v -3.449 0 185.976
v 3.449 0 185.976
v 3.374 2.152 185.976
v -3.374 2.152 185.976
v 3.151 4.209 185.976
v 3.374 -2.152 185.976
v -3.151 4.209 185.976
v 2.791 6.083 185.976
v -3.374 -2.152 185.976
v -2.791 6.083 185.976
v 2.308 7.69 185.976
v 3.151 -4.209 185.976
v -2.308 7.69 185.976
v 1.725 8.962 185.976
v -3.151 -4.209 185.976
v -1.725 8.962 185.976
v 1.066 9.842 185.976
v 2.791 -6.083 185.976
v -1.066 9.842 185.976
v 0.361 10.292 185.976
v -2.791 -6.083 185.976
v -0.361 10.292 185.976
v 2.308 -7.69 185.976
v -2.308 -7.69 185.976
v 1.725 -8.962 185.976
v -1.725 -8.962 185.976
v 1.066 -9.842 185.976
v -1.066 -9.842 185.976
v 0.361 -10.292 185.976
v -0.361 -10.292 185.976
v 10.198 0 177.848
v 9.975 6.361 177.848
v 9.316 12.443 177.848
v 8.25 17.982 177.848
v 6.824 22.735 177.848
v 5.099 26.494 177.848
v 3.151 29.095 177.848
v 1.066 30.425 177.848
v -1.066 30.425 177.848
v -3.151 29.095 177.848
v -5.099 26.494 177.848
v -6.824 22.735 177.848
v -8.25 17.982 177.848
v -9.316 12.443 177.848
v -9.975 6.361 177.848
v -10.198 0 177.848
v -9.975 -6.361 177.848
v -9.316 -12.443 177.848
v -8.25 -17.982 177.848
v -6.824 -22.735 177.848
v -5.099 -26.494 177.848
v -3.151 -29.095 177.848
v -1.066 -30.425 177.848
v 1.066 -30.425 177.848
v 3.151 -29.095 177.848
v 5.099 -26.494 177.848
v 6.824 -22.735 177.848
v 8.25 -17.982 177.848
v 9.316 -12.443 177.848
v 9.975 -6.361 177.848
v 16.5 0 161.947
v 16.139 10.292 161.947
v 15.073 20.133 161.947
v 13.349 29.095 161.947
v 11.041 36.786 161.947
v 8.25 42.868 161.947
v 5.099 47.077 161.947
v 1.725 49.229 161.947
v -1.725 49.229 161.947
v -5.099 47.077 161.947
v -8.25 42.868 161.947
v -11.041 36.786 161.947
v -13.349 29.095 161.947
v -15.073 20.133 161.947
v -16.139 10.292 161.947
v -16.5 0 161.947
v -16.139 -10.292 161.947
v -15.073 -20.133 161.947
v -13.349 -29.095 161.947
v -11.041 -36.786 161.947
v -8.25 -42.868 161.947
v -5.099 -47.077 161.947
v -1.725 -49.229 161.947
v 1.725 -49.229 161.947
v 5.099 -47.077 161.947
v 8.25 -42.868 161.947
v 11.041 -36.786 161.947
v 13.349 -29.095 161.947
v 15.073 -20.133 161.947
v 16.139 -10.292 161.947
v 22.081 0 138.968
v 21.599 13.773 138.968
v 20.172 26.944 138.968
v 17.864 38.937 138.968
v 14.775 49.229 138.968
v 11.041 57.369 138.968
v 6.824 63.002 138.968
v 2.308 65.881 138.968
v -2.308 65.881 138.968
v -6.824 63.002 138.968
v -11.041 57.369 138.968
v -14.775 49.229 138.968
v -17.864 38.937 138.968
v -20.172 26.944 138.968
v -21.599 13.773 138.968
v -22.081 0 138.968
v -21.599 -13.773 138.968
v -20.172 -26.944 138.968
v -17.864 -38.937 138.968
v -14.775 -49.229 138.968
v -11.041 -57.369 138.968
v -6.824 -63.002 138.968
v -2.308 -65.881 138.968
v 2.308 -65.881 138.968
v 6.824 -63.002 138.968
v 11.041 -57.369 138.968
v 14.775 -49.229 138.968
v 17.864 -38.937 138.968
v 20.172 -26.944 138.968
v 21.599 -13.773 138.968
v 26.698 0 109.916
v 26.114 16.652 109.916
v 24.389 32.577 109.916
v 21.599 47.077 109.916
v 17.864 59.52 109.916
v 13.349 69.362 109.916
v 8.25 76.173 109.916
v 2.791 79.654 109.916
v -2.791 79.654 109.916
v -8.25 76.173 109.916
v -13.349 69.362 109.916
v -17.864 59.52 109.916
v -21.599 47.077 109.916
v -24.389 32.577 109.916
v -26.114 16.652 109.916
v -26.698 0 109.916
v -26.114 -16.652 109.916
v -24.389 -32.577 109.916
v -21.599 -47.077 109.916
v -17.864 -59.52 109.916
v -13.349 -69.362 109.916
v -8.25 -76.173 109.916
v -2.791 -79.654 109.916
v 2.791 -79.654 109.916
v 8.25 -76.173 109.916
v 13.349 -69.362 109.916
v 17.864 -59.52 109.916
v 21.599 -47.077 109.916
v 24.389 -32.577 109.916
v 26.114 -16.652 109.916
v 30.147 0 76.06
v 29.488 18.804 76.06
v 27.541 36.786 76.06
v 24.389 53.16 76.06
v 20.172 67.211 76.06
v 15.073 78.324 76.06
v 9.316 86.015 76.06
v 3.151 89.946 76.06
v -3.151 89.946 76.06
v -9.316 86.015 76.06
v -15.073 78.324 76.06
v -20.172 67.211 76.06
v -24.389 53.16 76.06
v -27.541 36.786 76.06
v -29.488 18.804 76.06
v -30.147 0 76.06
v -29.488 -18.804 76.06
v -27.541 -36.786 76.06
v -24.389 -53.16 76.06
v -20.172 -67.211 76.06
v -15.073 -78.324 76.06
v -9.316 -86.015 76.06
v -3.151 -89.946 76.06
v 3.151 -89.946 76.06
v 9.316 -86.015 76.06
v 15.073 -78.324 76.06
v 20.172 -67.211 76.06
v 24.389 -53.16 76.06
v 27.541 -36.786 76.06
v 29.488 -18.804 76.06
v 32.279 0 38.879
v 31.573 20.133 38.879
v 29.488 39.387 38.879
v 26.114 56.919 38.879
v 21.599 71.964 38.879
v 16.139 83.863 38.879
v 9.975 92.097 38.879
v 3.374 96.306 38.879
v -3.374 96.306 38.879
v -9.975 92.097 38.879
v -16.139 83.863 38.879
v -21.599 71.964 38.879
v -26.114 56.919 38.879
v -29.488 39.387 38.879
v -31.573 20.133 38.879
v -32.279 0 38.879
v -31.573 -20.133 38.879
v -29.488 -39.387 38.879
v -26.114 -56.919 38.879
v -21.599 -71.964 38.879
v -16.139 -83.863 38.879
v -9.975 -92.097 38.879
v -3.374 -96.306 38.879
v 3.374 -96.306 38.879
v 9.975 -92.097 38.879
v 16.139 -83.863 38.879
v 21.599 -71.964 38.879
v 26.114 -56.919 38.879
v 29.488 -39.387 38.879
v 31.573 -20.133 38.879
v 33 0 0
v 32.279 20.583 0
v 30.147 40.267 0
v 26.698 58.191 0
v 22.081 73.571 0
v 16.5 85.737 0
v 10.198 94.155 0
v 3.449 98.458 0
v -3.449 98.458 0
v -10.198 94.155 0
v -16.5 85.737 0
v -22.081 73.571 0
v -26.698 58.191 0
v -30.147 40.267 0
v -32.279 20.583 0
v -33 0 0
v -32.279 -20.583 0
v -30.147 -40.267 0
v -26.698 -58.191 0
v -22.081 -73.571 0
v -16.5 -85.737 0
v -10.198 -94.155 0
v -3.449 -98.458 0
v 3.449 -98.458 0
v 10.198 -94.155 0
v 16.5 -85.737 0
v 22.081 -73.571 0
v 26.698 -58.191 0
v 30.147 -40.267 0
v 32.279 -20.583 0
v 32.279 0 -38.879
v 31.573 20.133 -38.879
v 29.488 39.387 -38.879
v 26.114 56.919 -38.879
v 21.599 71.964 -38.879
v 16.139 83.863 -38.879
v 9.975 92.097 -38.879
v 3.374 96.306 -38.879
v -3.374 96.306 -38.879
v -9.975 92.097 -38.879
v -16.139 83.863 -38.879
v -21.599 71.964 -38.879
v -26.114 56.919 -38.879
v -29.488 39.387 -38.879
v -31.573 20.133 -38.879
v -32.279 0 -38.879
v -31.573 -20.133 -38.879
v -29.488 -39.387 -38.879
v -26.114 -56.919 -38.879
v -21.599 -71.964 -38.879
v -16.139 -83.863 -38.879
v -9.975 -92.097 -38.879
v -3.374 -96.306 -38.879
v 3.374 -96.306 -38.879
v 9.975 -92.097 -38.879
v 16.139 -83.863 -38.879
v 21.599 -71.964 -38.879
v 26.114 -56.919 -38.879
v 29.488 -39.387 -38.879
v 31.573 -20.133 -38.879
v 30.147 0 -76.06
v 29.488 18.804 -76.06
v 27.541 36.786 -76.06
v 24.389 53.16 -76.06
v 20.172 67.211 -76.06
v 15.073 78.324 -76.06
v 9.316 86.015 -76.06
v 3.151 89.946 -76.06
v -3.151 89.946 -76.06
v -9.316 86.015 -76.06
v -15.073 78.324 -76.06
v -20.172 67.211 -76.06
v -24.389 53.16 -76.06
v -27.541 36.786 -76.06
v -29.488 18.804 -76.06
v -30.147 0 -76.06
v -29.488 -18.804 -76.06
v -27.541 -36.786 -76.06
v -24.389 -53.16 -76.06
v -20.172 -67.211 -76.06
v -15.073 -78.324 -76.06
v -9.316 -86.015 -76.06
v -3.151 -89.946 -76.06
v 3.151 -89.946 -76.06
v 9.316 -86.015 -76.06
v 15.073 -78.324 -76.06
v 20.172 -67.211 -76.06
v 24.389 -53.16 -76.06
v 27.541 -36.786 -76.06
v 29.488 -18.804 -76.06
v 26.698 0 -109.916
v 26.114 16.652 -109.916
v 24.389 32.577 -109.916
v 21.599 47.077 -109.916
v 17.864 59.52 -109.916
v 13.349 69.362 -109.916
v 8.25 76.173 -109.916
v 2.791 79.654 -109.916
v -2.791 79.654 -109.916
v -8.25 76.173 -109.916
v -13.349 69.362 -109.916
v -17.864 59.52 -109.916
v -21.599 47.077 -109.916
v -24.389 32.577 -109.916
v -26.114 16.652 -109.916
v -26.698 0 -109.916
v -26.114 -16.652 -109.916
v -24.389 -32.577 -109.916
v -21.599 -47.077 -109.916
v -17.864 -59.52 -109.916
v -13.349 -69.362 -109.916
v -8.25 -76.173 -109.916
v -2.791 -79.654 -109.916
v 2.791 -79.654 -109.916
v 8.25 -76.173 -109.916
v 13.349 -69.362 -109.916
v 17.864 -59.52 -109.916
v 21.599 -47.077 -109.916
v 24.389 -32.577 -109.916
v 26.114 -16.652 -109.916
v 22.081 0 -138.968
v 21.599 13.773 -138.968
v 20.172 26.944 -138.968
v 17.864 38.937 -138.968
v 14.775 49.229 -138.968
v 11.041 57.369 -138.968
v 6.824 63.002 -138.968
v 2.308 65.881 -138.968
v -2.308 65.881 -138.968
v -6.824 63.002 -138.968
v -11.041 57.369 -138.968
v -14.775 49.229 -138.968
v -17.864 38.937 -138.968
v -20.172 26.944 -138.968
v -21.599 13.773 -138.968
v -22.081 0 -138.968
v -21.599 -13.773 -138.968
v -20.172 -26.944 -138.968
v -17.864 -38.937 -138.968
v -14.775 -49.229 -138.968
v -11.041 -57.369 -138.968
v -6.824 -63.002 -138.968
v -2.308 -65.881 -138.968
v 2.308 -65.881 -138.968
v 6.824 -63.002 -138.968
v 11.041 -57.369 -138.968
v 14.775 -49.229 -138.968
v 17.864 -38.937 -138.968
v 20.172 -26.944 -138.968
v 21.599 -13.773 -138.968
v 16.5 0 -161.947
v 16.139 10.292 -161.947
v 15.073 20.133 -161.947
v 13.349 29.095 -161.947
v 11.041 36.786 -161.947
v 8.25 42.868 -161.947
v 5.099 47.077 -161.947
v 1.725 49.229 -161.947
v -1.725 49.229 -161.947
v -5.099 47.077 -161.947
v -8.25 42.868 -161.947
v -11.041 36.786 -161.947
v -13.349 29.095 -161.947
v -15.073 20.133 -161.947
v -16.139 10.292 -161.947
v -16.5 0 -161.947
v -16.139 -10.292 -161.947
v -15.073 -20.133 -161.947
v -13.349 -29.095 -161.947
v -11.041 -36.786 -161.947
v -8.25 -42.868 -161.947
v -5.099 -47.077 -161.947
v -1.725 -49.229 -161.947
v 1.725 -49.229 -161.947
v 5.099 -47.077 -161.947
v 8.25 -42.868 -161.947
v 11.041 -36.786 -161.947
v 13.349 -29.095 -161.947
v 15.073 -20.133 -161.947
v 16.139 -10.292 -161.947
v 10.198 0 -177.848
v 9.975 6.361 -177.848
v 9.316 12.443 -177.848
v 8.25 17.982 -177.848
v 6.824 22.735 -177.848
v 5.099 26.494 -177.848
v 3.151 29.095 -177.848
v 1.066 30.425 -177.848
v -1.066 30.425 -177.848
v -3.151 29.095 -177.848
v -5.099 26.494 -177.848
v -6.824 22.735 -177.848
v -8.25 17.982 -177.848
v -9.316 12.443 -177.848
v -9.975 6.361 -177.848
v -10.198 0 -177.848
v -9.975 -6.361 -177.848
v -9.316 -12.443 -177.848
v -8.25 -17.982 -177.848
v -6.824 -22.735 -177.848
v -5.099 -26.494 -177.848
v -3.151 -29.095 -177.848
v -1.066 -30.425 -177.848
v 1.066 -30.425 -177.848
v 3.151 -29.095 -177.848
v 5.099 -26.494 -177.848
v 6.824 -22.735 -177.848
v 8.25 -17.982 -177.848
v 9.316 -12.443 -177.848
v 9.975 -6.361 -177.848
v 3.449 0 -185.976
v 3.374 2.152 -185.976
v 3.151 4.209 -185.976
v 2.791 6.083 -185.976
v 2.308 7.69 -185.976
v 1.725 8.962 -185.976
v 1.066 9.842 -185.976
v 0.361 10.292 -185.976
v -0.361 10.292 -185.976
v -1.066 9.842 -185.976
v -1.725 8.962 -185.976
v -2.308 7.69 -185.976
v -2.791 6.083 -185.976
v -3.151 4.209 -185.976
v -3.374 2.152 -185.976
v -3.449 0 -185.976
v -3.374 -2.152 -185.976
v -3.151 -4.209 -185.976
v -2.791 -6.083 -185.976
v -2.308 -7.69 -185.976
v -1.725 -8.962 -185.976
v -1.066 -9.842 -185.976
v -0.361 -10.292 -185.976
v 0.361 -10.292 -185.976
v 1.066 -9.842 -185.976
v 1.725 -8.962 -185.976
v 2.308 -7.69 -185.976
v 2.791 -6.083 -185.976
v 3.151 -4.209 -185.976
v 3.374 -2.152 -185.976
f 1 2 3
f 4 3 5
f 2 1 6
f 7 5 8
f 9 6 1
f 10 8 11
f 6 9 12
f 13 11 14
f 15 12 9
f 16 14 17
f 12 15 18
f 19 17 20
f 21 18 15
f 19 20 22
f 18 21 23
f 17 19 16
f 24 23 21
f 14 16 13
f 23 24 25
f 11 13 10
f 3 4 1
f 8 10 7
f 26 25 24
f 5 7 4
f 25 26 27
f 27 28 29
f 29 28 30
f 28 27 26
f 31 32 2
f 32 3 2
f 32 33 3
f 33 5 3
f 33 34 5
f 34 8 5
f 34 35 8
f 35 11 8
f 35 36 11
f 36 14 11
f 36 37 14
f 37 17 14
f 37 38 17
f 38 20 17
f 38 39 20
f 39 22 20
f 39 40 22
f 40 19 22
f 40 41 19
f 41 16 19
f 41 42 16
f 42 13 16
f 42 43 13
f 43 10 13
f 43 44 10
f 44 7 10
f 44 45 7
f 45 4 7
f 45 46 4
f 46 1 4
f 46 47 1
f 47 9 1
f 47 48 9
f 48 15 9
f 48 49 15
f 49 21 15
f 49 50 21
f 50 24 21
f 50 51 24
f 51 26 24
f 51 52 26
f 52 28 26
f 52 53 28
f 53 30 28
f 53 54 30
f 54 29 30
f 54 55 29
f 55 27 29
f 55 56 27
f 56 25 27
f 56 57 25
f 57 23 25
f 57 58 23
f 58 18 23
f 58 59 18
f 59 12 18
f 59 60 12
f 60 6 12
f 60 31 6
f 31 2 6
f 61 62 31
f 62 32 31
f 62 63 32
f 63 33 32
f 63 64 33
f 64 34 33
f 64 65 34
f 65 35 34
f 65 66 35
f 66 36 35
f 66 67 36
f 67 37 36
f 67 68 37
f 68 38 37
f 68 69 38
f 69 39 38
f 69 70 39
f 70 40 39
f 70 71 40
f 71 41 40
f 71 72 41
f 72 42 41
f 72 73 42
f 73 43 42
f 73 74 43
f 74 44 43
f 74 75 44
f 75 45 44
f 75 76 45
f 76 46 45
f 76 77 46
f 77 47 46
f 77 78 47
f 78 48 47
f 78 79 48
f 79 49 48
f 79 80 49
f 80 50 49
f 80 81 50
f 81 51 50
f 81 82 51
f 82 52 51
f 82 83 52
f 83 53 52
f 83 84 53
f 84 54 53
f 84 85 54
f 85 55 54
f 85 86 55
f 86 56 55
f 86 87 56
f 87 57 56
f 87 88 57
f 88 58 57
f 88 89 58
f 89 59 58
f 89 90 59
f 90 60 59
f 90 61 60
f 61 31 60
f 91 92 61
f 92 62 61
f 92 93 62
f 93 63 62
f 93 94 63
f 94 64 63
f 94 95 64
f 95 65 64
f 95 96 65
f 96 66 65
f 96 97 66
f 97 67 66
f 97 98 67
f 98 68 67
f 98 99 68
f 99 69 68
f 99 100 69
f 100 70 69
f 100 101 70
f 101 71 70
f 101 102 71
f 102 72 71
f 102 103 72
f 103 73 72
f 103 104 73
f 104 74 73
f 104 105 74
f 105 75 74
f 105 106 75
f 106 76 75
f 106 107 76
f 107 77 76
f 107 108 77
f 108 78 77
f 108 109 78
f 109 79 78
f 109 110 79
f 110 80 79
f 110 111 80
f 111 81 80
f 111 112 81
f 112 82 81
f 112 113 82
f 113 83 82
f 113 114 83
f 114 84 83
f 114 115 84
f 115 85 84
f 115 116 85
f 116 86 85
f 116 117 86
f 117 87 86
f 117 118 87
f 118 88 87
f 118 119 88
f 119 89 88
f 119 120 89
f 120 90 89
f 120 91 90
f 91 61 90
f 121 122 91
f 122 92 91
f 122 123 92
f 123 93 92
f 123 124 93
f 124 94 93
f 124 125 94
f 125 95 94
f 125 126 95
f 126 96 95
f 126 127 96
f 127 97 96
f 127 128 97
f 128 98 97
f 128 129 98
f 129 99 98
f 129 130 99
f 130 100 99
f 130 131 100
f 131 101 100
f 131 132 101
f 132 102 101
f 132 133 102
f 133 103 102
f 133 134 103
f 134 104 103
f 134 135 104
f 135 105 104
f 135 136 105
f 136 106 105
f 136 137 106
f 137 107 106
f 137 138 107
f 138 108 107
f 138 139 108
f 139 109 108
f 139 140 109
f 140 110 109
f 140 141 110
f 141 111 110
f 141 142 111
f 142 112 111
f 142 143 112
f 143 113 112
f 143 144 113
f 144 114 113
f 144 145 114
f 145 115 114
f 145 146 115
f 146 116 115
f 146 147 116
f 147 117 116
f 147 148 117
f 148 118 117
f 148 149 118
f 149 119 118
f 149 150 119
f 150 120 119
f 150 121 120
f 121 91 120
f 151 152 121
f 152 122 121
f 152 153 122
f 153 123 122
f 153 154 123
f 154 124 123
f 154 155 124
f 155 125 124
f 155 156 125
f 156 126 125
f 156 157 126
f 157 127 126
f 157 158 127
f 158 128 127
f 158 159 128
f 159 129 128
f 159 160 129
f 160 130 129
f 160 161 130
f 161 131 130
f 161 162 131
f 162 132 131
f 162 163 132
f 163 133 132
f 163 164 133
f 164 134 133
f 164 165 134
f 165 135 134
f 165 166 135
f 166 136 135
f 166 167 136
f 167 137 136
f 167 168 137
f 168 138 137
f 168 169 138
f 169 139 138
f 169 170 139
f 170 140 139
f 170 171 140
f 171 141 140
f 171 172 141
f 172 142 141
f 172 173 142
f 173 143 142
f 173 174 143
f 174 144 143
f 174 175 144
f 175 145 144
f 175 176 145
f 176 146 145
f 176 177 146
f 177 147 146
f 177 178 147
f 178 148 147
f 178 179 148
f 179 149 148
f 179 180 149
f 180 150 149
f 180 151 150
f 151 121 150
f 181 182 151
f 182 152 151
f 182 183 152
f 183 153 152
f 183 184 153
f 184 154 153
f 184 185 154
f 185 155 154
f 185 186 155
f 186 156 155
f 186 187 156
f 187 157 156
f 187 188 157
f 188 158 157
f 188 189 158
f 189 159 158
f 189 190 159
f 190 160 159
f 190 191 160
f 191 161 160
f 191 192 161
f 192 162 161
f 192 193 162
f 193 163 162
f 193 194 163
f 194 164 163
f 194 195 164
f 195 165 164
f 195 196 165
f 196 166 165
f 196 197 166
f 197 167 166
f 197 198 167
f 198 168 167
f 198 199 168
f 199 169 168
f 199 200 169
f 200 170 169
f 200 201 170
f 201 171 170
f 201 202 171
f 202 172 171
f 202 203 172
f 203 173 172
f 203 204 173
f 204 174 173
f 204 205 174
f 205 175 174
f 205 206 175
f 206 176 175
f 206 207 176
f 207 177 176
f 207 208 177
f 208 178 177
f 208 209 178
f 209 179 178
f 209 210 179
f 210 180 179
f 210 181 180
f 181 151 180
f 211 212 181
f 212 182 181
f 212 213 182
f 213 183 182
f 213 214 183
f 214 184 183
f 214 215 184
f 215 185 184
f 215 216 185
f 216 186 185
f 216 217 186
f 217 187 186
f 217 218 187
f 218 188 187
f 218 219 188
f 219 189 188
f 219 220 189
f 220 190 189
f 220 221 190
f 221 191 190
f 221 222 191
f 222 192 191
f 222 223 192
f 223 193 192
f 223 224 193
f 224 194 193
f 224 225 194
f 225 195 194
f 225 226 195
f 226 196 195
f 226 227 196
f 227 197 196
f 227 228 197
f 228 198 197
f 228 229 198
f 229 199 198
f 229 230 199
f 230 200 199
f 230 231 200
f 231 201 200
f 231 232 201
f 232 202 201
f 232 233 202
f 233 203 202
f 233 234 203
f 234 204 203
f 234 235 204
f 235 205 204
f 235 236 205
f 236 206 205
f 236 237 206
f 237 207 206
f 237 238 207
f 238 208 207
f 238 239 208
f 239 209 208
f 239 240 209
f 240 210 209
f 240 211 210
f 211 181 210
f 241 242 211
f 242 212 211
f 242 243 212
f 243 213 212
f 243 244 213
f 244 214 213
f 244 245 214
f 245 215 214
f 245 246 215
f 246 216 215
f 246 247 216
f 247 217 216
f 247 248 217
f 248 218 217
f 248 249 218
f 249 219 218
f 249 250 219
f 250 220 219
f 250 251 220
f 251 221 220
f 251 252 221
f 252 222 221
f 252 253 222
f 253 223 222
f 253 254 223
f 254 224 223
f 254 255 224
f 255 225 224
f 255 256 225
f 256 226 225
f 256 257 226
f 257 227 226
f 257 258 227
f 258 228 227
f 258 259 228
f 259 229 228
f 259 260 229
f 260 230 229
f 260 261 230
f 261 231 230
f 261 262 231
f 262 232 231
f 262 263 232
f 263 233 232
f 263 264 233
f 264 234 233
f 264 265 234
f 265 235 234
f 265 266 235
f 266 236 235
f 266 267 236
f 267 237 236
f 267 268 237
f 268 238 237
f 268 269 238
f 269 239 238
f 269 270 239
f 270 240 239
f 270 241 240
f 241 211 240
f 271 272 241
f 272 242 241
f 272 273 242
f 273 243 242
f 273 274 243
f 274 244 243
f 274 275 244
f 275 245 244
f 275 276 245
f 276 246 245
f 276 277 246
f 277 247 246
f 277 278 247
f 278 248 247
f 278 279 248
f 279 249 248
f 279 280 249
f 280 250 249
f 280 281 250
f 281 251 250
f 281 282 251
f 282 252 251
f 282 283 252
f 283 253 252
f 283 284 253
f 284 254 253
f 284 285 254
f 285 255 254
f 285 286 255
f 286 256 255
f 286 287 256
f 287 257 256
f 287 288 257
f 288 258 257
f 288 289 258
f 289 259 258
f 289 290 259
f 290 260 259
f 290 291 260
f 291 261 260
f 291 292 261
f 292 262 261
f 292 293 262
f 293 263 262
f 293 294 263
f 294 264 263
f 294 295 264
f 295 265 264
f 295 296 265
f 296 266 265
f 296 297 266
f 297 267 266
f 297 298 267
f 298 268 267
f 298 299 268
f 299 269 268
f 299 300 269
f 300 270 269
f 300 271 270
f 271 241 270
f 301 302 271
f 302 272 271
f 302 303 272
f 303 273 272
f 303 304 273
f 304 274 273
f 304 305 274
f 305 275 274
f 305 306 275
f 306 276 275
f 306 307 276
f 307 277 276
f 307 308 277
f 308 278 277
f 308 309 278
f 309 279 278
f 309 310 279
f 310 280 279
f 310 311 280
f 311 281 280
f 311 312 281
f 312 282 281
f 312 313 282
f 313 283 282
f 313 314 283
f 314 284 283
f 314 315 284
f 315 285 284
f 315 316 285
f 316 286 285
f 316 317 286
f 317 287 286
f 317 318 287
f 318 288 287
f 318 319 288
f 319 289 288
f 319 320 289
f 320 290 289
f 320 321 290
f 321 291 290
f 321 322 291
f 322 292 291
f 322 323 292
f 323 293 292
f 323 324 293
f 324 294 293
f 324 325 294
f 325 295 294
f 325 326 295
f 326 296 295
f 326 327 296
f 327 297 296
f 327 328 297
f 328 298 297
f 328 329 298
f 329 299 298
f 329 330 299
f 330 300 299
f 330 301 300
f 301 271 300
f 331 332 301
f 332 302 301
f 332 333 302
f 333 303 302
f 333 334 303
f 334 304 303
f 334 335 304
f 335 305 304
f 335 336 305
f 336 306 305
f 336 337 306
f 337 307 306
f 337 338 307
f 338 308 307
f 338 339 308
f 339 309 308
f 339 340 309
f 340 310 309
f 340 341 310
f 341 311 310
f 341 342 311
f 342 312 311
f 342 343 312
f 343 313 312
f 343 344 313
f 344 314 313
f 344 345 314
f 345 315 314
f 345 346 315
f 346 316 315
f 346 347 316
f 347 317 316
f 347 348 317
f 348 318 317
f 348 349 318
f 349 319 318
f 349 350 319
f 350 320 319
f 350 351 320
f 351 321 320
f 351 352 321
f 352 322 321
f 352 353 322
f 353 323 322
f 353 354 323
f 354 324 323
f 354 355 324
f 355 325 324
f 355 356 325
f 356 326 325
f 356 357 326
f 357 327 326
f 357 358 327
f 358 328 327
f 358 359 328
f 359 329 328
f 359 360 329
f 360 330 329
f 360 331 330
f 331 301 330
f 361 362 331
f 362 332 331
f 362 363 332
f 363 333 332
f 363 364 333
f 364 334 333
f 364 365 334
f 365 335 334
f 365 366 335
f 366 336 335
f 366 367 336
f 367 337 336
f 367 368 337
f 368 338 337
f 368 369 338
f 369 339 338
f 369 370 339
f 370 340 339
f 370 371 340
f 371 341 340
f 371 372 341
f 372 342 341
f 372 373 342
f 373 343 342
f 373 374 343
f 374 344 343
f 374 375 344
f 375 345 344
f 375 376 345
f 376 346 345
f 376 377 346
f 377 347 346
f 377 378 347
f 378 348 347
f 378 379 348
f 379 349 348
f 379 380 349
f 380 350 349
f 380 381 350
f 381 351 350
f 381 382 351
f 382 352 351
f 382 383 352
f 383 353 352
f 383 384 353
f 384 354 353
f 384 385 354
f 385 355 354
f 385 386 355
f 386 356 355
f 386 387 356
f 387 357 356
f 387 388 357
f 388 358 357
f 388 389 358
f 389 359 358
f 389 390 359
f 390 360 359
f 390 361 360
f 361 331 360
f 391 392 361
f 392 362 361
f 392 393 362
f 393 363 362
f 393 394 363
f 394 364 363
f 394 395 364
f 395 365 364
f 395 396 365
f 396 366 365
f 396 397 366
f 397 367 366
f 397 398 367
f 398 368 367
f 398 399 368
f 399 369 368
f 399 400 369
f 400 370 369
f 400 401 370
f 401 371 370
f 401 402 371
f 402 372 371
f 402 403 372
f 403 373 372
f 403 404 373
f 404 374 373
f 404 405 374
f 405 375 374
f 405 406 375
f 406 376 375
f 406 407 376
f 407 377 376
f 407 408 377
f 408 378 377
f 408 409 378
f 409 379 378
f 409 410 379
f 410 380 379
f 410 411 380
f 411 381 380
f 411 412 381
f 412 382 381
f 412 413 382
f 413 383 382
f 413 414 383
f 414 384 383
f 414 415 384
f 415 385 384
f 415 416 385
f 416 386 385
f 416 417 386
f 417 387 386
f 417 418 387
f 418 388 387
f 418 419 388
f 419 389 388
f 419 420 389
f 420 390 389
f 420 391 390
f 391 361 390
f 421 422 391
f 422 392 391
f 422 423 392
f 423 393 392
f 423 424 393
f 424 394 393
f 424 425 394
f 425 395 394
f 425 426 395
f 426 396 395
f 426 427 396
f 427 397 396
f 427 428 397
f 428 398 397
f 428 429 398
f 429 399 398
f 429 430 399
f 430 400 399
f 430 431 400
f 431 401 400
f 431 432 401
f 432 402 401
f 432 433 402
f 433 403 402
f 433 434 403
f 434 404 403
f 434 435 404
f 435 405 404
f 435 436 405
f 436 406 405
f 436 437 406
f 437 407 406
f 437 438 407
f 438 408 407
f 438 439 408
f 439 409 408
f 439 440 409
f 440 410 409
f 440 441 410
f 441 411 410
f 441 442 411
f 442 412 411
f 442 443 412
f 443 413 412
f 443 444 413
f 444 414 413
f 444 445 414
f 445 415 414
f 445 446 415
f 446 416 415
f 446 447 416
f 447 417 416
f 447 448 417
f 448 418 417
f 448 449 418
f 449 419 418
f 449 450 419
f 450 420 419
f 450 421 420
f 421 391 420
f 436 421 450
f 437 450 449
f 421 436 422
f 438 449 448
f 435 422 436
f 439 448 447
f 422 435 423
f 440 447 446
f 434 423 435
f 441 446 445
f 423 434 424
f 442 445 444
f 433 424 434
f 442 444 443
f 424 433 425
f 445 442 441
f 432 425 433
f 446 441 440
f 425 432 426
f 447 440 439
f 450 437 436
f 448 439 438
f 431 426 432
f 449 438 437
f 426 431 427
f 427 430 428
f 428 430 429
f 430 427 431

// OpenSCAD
// Generated by SolidPython 1.0.1 on 2020-07-29 00:46:45


scale(v = [3, 9, 17]) {
	sphere(r = 11);
}
/***********************************************
*********      SolidPython code:      **********
************************************************
 
# import packages: SolidPython
from solid import *
from solid.utils import *
from itertools import chain, combinations, permutations


class Resize:

    def __init__(self, scad_file):
        self.scad_file = scad_file
        #self.scad_file = import_scad(scad_file)
        # cone/cylinder param:
        self.r1 = 0
        self.r2 = 0
        self.h = 0
        # rectangular prism param:
        self.w = 0
        self.l = 0
        # ellipse param:
        self.r = 0

    # import OpenScad code (file name corresponds to shape)


    # classify shape + parameters
    def assign(self, param1, param2, param3):
        if self.scad_file == 'cone.scad':
            self.r1 = param1
            self.r2 = param2
            self.h = param3
        elif self.scad_file == 'cylinder.scad':
            self.r1 = param1
            self.r2 = param2
            self.h = param3
        elif self.scad_file == 'rectangularPrism.scad':
            self.h = param1
            self.l = param2
            self.w = param3
        else:
            self.r = param1
            self.h = param2

    # resize parameters
    def iterate(self):
        x = range(3, 20, 2)
        i = 1
        if self.scad_file == 'cone.scad':
            tempList = list(permutations(x, 2))
            for temp in tempList:
                param1 = temp[0]
                param2 = temp[1]
                filepath = 'produced_scad_files/' + 'cone' + str(param1) + '_' + str(param2) + '_' + '.scad'
                scad_render_to_file(cylinder(h=param1, r1=param2, r2=0), filepath)

        elif self.scad_file == 'cylinder.scad':
            tempList = list(permutations(x, 3))
            for temp in tempList:
                param1 = temp[0]
                param2 = temp[1]
                filepath = 'produced_scad_files/' + 'cylinder' + str(param1) + '_' + str(param2) + '_' + '.scad'
                scad_render_to_file(cylinder(h=param1, r1=param2, r2=param2), filepath)

        elif self.scad_file == 'rectangularPrism.scad':
            tempList = list(permutations(x, 3))
            for temp in tempList:
                param1 = temp[0]
                param2 = temp[1]
                param3 = temp[2]
                filepath = 'produced_scad_files/' + 'rectangularPrism' + str(param1) + '_' + str(param2) + '_' + str(
                    param3) + '.scad'
                scad_render_to_file(cube(size=(param1, param2, param3)), filepath)

        elif self.scad_file == 'ellipse.scad':
            tempList = list(permutations(x, 4))
            for temp in tempList:
                param1 = temp[0]
                param2 = temp[1]
                param3 = temp[2]
                param4 = temp[3]
                filepath = 'produced_scad_files/' + 'ellipse' + str(param1) + '_' + str(param2) + '_' + str(param3) + '_' + str(param4) + '.scad'
                scad_render_to_file(scale([param1, param2, param3])(sphere(r=param4)), filepath)

    def render_to_scadfile(self):
        scad_render_to_file(scad, 'example.scad') 
 
************************************************/
